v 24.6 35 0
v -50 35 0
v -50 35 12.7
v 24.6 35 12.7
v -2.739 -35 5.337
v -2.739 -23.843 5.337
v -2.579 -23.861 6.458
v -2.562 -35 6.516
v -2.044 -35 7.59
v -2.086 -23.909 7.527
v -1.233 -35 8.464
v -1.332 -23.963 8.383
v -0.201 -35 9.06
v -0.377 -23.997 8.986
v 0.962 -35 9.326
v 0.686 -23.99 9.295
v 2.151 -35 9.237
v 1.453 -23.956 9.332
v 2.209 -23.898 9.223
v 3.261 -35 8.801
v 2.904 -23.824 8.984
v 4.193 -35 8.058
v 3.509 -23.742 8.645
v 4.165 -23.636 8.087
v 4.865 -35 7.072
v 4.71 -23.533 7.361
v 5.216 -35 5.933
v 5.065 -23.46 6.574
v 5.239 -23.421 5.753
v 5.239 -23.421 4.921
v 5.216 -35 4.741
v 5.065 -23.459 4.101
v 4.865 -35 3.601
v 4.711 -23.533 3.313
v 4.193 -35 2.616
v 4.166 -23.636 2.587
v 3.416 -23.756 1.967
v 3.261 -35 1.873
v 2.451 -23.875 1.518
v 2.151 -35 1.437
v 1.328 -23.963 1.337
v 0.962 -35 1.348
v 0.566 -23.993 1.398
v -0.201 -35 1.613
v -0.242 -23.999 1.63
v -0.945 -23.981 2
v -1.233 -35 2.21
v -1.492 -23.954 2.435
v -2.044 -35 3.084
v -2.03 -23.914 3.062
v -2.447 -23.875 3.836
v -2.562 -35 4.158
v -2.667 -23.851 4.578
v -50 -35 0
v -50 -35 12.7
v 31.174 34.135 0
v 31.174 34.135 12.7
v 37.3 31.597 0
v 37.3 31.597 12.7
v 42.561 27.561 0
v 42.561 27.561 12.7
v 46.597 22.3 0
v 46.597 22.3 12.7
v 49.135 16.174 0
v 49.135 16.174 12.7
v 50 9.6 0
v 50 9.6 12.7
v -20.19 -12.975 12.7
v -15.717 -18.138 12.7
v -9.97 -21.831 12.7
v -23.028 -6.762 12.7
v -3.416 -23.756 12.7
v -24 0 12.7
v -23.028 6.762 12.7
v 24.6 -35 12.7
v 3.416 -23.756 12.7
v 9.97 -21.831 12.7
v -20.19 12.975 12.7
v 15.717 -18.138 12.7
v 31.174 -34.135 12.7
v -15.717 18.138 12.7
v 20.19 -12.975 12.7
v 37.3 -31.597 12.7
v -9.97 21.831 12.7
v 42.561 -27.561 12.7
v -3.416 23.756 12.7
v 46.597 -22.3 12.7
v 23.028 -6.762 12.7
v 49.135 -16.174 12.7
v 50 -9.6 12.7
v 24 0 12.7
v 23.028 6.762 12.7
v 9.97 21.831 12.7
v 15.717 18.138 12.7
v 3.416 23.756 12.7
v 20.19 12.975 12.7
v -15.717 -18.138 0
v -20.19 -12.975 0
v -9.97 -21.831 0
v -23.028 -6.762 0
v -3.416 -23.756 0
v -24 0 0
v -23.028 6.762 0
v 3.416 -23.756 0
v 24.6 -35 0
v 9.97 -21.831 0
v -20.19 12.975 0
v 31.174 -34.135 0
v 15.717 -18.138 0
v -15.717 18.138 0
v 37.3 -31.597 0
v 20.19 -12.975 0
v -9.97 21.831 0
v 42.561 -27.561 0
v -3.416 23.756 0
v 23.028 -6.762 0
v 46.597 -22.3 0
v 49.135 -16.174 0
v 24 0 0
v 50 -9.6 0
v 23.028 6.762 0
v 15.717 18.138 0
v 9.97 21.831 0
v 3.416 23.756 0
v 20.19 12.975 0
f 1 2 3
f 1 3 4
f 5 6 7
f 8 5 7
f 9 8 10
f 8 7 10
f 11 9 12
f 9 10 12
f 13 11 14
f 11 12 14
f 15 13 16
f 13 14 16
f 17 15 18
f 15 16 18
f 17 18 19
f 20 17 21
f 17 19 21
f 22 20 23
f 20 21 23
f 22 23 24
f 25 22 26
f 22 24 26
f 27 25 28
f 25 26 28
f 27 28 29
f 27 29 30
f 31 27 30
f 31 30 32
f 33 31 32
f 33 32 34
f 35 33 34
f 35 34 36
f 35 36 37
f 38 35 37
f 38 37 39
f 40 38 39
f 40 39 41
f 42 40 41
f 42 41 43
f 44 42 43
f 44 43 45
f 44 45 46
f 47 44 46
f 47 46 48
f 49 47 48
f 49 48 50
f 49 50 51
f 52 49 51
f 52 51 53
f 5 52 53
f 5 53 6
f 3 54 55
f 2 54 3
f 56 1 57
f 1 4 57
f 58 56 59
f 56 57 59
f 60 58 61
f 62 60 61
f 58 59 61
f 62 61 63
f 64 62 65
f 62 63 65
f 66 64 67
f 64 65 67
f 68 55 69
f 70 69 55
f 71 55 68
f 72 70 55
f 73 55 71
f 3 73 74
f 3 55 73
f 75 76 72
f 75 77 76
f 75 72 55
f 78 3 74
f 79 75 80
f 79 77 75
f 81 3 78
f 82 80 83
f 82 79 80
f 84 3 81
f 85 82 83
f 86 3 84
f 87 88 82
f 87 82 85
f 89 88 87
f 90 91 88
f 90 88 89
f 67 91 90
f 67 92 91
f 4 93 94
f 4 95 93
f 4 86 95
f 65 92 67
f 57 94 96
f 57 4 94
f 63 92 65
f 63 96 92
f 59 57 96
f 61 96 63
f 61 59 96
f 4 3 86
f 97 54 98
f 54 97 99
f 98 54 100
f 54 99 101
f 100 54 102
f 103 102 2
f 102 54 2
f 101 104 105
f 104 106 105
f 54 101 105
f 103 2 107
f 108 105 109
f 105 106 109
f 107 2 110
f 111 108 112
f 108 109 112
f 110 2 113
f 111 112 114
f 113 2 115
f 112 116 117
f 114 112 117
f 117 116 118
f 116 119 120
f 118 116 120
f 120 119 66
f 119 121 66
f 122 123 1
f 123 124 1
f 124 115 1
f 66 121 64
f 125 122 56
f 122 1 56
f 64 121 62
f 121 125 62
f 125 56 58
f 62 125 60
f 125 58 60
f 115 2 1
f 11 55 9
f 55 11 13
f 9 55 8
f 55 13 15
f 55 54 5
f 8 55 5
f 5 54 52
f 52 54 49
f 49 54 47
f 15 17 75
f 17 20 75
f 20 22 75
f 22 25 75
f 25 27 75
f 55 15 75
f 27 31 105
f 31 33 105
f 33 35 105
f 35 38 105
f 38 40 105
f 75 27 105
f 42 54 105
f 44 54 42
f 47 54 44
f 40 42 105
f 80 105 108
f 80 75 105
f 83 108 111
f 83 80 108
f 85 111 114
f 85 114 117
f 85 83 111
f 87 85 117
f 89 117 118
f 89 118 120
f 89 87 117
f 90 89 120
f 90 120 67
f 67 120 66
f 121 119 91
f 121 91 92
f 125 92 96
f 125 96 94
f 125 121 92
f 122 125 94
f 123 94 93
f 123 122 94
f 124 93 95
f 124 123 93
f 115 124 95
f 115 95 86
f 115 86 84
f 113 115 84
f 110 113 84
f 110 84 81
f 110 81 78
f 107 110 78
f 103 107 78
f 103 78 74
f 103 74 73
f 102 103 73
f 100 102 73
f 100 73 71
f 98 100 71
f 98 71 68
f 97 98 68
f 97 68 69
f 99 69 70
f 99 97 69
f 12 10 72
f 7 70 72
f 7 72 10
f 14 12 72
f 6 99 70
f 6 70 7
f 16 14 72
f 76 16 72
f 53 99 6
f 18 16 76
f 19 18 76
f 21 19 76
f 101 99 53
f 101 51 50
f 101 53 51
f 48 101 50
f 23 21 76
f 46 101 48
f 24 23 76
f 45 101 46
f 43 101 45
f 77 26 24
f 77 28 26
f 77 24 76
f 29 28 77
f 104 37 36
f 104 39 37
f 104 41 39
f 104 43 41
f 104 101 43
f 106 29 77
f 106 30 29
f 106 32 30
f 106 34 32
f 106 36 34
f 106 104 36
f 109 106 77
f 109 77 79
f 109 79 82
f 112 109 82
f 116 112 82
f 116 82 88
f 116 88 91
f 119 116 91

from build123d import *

# Parameters (mm, degrees)
F0_W     = 100
F0_H     = 70
F0_R     = 24
F1_DEPTH = 12.7
F2_R     = 25.4
F4_D     = 8
F4_DEPTH = 12.7


with BuildPart() as f1:
    # F0 (on Top) → F1 (new body)
    with BuildSketch(Plane.XY):
        Rectangle(F0_W, F0_H)
        Circle(F0_R, mode=Mode.SUBTRACT)
    extrude(amount=F1_DEPTH)

    # F2
    f2_edges = [f1.edges().sort_by_distance(p)[0] for p in [
        (50, -35, 6.35),
        (50, 35, 6.35),
    ]]
    fillet(f2_edges, radius=F2_R)

    # F4
    with Locations(Plane.XZ.offset(35)):
        with Locations((1.260702, 5.33683)):
            Hole(F4_D / 2, depth=F4_DEPTH)


solid = f1.part
